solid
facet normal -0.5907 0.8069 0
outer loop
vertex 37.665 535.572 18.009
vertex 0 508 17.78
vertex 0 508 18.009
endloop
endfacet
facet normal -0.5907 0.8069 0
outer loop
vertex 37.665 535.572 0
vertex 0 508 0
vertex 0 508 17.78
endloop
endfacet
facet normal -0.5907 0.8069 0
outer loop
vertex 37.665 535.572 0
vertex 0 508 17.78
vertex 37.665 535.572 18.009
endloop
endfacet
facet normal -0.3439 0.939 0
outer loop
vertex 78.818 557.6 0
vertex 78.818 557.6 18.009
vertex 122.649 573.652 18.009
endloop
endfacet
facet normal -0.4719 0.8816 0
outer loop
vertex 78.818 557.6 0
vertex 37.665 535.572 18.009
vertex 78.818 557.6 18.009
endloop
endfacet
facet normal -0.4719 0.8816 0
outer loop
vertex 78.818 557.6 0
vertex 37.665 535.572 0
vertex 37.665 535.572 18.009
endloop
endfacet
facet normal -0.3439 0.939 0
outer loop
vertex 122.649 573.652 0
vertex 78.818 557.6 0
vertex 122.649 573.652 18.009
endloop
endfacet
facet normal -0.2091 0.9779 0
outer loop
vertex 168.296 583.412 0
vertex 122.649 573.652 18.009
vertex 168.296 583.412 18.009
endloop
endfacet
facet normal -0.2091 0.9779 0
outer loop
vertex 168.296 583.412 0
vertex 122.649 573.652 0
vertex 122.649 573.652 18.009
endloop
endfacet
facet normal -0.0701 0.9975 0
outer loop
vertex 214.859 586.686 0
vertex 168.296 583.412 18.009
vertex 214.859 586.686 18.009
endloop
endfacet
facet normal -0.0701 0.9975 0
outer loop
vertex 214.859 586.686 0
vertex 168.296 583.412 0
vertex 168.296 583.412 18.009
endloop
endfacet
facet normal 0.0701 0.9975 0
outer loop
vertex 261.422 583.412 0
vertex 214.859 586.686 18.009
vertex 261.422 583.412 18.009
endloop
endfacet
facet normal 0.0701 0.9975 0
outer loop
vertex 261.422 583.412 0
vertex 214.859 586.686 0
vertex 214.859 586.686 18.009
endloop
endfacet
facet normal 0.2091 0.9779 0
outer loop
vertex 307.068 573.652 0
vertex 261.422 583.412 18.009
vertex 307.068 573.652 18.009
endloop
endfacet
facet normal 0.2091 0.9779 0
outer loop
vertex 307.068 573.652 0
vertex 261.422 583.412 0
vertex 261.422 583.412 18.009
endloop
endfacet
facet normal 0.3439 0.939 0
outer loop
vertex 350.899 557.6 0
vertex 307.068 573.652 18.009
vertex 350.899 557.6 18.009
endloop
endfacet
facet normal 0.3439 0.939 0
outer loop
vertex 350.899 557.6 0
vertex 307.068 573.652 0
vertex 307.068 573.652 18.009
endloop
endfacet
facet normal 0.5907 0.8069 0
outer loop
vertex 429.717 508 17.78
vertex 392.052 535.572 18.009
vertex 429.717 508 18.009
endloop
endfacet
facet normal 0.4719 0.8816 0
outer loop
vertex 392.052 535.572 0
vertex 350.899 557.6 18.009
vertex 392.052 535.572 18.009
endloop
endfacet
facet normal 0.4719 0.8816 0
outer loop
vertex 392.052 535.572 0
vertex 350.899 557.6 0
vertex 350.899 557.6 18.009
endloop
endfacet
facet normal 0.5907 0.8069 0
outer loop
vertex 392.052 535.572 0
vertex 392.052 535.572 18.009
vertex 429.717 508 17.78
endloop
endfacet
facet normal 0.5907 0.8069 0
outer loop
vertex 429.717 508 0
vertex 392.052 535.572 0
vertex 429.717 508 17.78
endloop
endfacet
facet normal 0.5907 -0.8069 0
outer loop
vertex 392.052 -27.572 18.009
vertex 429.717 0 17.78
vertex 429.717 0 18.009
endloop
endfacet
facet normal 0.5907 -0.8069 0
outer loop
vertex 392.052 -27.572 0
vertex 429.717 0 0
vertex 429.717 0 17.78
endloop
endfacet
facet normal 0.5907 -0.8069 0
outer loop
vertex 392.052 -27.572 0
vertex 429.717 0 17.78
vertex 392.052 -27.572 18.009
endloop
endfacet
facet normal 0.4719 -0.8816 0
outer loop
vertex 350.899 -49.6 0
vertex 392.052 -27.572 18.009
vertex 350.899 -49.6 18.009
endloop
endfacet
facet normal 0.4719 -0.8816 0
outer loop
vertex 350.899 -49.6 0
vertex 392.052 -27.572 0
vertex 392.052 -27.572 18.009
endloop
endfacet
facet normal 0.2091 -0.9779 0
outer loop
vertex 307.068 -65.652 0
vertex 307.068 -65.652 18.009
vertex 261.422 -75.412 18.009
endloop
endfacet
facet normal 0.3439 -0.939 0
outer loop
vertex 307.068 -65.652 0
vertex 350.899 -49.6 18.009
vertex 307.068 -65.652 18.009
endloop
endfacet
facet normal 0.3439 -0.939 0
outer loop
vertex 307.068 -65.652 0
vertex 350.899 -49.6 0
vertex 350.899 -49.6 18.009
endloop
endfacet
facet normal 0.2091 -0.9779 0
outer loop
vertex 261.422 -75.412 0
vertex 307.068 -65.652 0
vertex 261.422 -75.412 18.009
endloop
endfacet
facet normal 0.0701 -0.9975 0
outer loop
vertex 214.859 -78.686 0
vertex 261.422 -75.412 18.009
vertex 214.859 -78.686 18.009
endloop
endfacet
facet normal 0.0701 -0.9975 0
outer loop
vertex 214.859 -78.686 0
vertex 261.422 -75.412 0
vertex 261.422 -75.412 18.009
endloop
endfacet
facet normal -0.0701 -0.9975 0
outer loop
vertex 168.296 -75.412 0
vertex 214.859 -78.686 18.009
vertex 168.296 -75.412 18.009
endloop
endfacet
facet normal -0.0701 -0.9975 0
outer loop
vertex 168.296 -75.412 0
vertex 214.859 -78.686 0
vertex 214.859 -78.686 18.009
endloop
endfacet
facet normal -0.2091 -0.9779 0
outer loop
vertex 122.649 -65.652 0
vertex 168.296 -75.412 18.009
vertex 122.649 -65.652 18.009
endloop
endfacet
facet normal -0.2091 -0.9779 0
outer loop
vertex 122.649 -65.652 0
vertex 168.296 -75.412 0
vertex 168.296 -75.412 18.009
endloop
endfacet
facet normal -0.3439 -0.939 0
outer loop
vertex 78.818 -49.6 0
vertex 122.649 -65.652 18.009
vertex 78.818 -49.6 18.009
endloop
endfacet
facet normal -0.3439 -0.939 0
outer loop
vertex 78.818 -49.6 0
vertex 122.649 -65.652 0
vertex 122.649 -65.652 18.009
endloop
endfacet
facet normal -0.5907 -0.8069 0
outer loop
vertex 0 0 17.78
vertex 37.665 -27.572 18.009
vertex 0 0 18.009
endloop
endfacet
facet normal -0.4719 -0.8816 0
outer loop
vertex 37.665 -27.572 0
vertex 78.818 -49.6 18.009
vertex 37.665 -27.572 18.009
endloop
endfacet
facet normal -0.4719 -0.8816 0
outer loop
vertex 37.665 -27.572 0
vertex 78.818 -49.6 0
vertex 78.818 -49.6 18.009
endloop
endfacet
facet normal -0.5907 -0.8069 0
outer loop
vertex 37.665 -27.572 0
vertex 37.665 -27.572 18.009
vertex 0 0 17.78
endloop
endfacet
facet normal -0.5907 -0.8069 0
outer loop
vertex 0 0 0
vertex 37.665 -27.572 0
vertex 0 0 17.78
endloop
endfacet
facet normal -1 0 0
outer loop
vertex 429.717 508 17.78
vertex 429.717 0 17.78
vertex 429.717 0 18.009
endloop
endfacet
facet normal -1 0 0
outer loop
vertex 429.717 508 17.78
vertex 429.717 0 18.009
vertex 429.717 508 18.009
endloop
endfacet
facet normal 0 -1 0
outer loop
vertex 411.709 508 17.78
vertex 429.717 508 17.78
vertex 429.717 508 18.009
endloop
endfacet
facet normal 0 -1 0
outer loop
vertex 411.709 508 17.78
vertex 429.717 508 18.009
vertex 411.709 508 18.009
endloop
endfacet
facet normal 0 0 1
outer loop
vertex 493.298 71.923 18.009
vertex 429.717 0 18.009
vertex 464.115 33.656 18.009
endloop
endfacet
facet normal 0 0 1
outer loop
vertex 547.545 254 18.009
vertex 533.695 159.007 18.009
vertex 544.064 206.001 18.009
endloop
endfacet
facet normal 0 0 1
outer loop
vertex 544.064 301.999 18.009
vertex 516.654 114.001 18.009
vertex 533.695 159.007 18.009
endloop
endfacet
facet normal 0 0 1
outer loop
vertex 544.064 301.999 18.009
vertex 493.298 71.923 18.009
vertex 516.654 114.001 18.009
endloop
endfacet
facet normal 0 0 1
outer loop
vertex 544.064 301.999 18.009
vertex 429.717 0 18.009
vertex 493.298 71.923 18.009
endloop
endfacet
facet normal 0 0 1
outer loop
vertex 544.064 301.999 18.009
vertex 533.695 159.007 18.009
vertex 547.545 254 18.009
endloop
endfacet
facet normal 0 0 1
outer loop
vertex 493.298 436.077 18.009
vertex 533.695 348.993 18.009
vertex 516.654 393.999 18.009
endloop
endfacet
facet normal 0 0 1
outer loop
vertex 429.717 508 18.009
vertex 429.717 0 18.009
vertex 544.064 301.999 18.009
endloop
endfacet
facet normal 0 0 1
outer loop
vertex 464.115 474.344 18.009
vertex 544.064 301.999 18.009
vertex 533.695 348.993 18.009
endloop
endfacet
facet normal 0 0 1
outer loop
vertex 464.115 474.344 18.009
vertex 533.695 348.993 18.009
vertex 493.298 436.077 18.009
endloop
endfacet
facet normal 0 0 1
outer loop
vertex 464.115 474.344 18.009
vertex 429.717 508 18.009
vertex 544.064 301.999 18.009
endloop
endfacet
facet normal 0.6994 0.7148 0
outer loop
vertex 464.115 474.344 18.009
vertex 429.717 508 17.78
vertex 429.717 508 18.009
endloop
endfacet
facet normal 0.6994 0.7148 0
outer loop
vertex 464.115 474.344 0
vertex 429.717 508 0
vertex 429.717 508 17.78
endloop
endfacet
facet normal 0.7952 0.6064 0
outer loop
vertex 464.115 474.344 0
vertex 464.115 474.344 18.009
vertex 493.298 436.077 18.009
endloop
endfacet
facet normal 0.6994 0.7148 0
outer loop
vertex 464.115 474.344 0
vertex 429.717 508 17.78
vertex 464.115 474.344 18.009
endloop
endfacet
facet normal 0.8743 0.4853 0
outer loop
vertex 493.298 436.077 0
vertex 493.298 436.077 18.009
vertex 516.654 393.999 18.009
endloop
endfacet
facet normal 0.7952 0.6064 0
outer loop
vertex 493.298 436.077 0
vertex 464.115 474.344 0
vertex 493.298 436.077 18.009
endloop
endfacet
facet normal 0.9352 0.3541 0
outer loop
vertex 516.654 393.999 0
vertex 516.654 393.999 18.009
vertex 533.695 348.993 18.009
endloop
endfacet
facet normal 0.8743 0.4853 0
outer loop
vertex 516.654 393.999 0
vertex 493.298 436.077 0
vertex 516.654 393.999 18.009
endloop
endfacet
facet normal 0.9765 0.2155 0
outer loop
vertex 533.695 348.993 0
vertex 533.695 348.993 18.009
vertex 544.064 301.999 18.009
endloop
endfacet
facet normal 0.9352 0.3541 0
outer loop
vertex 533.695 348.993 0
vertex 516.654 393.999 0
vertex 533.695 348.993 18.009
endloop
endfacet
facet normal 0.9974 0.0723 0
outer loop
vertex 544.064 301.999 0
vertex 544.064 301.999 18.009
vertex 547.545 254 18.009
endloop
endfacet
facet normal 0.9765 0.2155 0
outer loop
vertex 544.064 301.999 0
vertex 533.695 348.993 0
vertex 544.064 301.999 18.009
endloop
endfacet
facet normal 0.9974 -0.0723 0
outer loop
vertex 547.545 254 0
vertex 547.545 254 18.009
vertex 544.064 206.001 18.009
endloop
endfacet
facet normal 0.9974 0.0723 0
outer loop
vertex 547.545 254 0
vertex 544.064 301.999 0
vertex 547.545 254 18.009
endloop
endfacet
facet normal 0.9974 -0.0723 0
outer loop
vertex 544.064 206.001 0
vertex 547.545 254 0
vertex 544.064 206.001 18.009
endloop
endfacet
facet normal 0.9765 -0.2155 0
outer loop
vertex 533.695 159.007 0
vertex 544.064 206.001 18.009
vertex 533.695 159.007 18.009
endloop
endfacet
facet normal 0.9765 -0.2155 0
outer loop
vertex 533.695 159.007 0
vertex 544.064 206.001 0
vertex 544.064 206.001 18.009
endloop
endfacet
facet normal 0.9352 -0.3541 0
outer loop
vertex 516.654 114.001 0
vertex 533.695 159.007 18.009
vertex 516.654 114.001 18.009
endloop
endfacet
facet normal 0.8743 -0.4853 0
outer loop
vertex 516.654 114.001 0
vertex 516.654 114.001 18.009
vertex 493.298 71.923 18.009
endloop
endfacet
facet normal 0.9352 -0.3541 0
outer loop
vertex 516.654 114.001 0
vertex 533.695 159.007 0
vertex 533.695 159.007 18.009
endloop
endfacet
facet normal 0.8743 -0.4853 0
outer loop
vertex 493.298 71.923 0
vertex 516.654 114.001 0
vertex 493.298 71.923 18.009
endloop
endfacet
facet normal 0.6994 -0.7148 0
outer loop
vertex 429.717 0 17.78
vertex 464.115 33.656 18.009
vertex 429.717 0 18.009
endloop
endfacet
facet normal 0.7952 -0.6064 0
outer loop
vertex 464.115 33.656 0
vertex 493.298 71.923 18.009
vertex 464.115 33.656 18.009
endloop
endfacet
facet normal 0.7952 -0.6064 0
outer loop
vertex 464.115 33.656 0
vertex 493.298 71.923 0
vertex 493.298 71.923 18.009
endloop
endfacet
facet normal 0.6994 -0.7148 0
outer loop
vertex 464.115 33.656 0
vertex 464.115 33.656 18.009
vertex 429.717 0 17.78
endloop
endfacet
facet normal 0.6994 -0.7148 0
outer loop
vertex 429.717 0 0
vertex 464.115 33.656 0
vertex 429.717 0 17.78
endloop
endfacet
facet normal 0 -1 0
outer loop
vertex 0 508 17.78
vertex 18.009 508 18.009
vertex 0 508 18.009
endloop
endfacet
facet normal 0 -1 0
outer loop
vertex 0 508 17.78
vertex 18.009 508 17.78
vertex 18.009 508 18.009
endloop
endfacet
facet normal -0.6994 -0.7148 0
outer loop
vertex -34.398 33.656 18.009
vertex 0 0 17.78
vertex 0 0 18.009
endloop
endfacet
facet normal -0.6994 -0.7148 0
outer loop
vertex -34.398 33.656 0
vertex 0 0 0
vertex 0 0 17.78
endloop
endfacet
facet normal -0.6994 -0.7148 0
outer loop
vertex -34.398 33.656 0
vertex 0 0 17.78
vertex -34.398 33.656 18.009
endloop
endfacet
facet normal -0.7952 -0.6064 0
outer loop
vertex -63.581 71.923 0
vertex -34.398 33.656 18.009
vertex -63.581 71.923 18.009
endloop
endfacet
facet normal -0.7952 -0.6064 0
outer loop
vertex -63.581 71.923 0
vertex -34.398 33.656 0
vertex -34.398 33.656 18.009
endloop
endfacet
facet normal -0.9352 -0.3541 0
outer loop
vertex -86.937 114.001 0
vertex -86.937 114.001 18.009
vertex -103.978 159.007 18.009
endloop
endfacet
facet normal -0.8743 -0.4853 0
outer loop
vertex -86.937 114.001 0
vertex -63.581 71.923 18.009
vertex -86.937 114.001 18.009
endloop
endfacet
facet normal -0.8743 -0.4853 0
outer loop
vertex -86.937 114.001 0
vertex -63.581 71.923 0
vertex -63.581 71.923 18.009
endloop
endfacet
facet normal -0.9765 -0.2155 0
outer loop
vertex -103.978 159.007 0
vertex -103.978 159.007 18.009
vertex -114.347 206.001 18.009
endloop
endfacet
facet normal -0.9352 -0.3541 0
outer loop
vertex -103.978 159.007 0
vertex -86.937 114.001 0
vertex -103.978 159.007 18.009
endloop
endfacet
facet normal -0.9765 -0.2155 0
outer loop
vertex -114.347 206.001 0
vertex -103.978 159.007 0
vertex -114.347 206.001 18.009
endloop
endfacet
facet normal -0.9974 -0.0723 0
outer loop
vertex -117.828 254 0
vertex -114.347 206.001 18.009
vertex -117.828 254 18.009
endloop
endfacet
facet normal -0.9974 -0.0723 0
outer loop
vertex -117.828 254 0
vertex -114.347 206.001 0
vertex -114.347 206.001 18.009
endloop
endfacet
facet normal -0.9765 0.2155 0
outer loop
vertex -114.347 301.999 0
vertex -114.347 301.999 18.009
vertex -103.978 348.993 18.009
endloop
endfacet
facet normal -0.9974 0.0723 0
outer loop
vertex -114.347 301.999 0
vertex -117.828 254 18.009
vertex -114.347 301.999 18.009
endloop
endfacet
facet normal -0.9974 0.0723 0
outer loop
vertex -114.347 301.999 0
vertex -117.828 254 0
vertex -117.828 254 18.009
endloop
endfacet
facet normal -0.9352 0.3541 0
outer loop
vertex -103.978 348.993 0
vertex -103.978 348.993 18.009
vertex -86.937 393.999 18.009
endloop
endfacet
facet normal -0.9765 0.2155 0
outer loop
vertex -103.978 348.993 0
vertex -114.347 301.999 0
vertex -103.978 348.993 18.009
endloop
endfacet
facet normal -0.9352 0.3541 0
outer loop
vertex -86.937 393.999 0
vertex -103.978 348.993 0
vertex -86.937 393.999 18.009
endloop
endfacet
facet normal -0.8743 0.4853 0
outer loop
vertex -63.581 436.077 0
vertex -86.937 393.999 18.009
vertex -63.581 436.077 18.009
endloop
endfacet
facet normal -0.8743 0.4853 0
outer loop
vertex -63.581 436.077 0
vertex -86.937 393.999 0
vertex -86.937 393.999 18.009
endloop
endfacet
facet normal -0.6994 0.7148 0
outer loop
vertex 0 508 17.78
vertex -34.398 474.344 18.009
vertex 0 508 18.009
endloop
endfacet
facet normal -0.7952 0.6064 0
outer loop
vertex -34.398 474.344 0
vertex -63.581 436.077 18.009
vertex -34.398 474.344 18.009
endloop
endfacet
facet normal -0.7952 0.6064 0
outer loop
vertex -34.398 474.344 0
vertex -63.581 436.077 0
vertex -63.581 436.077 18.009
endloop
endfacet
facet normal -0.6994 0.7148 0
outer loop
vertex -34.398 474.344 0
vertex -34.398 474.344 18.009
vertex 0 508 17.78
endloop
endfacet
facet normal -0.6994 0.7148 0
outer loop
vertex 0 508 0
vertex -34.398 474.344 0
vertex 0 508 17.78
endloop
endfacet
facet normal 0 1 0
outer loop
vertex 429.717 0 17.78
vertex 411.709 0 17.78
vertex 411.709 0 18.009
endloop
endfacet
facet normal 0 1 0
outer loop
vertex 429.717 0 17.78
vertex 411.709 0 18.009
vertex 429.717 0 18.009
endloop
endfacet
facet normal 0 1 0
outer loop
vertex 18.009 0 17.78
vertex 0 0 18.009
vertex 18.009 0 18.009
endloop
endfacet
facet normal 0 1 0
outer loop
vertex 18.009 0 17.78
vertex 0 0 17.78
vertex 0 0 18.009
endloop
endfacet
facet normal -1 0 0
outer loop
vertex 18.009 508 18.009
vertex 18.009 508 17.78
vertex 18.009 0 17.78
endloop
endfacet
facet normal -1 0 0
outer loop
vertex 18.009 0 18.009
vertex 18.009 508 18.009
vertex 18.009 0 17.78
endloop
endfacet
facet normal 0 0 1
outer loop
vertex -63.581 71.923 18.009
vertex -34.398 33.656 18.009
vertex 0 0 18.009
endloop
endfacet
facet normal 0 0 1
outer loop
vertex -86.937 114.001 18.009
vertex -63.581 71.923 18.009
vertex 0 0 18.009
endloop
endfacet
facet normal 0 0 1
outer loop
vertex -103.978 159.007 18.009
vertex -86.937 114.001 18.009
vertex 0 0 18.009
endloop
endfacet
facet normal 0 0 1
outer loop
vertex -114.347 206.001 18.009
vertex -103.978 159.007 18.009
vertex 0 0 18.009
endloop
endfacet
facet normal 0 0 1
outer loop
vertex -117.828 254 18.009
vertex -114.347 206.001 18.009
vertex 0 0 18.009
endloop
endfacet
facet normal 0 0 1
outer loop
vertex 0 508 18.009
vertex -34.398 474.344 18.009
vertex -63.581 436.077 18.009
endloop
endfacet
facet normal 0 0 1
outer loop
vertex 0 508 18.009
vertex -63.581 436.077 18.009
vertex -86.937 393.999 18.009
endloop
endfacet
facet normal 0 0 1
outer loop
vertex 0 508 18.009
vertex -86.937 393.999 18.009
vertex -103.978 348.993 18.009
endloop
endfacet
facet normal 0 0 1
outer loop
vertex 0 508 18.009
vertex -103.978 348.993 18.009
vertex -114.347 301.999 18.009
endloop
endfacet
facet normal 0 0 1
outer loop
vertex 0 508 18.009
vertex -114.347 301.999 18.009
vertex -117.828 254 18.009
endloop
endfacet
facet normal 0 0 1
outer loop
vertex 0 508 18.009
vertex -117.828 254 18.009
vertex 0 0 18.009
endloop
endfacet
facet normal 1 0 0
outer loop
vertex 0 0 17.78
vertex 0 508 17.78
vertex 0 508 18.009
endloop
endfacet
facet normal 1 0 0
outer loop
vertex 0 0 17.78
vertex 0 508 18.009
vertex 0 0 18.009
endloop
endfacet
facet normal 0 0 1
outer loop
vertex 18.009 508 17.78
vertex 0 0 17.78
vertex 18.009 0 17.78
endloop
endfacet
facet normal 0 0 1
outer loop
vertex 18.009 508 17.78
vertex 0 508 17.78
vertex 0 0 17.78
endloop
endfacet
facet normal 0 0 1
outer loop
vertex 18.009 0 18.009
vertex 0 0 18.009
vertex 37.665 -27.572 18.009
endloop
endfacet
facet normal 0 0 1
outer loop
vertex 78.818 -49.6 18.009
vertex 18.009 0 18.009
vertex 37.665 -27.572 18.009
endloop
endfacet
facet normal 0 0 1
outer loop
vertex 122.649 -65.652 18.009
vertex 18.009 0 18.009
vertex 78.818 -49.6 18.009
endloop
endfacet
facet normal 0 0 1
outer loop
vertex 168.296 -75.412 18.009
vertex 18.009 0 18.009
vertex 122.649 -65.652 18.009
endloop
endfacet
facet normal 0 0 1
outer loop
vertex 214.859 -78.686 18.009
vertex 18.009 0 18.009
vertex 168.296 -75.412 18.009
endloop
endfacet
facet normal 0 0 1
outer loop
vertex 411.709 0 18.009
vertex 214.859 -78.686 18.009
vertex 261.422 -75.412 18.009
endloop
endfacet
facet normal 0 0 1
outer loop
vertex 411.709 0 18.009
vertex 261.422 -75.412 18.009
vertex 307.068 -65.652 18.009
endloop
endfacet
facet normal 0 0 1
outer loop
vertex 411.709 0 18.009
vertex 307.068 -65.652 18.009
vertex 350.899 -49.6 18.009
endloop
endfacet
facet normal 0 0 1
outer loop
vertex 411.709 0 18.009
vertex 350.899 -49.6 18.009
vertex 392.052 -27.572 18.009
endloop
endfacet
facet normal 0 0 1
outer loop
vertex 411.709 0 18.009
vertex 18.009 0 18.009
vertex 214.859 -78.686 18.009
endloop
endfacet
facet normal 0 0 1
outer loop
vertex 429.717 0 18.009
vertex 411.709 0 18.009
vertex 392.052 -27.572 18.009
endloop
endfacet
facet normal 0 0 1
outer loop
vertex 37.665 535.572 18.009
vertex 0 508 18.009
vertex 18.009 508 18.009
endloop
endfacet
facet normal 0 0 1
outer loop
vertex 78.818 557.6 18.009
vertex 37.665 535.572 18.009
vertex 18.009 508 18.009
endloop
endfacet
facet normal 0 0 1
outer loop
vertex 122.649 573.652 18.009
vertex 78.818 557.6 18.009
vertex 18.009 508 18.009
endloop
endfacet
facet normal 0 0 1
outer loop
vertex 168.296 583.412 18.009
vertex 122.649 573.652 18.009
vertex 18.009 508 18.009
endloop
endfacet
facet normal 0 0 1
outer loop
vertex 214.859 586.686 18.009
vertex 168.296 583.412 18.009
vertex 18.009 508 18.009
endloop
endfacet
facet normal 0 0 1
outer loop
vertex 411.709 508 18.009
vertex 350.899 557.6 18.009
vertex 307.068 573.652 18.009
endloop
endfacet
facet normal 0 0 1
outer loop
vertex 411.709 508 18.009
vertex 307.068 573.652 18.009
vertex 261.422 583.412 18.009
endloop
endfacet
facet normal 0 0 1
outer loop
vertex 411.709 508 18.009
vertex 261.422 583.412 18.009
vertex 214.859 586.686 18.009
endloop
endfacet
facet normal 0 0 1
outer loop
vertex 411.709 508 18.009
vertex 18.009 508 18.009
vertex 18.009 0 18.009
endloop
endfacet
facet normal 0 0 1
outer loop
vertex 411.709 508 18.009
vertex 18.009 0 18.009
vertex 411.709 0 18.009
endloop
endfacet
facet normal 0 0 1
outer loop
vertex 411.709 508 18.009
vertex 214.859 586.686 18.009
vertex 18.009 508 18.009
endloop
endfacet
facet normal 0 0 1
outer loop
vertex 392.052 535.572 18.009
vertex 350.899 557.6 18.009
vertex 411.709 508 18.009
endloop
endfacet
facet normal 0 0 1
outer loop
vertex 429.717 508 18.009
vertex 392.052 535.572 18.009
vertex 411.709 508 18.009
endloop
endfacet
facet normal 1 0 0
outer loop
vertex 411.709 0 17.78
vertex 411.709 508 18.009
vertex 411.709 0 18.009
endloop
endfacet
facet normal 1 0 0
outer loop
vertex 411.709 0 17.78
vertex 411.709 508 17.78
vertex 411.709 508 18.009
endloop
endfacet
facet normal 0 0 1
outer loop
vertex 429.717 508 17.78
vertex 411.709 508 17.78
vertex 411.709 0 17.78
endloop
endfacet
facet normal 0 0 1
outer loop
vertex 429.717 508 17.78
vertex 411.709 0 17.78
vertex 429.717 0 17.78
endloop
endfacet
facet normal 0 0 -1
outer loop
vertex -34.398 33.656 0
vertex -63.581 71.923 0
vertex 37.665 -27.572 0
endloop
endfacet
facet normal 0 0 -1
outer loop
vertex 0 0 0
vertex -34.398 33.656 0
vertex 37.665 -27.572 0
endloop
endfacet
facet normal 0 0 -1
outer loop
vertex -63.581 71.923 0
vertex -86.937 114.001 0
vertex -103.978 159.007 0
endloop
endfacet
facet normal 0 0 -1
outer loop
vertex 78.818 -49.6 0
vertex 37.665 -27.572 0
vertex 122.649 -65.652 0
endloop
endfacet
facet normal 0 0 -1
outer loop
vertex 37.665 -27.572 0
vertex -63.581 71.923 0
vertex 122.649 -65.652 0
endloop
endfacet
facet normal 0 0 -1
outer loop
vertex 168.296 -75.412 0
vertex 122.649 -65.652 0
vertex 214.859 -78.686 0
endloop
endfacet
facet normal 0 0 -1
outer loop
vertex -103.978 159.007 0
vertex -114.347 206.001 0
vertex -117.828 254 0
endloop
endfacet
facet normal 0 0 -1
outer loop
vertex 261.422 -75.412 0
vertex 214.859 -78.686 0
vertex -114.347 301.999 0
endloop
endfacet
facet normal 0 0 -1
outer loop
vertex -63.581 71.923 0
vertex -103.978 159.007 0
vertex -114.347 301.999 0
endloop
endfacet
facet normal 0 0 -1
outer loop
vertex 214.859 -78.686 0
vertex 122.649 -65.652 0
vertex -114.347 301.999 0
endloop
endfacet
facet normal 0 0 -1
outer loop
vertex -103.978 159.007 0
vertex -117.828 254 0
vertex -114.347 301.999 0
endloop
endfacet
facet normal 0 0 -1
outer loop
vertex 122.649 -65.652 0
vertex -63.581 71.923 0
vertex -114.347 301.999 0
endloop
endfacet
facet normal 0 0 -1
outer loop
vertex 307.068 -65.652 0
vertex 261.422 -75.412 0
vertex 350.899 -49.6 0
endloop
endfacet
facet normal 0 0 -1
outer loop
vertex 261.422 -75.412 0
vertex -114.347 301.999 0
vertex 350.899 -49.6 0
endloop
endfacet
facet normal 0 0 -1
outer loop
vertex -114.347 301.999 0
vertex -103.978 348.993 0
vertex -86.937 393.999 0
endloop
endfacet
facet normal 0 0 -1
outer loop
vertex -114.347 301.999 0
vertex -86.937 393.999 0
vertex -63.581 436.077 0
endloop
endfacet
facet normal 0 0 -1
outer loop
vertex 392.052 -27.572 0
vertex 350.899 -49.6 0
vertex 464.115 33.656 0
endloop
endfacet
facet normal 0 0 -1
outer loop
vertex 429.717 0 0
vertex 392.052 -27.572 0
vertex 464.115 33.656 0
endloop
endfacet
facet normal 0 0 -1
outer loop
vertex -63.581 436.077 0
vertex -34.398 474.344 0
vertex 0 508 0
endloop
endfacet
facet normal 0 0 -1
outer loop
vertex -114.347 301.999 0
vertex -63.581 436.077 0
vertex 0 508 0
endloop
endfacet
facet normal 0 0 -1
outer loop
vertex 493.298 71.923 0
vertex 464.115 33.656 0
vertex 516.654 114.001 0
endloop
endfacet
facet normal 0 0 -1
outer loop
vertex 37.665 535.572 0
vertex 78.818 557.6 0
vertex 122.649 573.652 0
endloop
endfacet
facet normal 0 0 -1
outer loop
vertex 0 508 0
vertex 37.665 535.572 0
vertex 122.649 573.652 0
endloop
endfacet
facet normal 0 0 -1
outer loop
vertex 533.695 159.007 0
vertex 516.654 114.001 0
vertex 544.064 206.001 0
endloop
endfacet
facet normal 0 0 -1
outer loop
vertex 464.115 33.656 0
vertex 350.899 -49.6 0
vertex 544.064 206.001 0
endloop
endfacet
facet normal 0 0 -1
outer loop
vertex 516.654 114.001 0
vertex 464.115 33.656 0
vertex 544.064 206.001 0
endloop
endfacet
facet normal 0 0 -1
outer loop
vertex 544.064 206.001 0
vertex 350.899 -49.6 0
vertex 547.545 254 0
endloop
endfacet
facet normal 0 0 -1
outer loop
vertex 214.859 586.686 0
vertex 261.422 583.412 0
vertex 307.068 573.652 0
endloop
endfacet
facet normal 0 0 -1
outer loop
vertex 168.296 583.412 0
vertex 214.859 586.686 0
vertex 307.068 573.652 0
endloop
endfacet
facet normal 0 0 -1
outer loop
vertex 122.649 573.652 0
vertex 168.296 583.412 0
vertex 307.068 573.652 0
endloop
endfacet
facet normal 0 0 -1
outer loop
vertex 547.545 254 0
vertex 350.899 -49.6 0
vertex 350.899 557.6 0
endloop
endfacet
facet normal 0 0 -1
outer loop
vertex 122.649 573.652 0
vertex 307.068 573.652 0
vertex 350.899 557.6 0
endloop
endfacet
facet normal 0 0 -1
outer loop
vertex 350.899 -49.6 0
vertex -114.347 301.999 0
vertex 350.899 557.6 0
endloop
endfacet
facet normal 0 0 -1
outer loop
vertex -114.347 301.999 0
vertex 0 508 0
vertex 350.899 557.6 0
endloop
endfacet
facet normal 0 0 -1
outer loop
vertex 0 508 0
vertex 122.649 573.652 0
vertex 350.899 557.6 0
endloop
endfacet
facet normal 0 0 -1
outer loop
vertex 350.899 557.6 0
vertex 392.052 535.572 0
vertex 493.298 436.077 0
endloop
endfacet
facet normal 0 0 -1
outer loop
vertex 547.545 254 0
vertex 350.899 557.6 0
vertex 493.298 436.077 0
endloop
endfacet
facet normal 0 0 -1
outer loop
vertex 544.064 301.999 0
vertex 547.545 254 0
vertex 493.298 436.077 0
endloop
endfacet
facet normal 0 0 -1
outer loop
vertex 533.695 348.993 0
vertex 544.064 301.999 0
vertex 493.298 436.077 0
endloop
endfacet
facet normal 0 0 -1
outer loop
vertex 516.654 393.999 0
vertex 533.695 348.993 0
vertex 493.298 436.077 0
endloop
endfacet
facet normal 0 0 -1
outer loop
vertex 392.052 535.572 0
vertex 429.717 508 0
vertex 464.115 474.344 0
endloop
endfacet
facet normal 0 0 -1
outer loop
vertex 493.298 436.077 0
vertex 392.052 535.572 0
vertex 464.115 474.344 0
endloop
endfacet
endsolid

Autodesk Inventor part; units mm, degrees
ref_plane "YZ Plane" through (0, 0, 0) normal (1, 0, 0) x (0, 1, 0)
ref_plane "XZ Plane" through (0, 0, 0) normal (0, 1, 0) x (-1, 0, 0)
ref_plane "XY Plane" through (0, 0, 0) normal (0, 0, 1) x (1, 0, 0)
sketch "Sketch1" plane through (0, 0, 0) normal (0, 0, 1) x (1, 0, 0)
  line L0 (0, 0) -> (429.7172, 0)
  line L1 (429.7172, 0) -> (429.7172, 508)
  line L2 (429.7172, 508) -> (0, 508)
  line L3 (0, 508) -> (0, 0)
  line L4 (18.0086, 508) -> (18.0086, 0)
  line L5 (411.7086, 508) -> (411.7086, 0)
  circle A0 centre (214.8586, 254) radius 332.6864
  point P0 (0, 254)
  dimension "d1" = 508
  dimension "d3" = 18.0086
  dimension "d4" = 18.0086
  dimension "d6" = 393.7
  dimension "d10" = 665.3727
  dimension "d13" = 214.8586
  dimension "d14" = 254
extrude "Extrusion2" add sketch "Sketch1" along normal blind 18.0086 contours A0 L3 | L0 A0 | L4 L2 L5 L0 | A0 L2 | L1 A0
extrude "Extrusion3" add sketch "Sketch1" along normal blind 17.78 contours L3 L2 L4 L0 | L0 L5 L2 L1
properties part number "base turntable"
